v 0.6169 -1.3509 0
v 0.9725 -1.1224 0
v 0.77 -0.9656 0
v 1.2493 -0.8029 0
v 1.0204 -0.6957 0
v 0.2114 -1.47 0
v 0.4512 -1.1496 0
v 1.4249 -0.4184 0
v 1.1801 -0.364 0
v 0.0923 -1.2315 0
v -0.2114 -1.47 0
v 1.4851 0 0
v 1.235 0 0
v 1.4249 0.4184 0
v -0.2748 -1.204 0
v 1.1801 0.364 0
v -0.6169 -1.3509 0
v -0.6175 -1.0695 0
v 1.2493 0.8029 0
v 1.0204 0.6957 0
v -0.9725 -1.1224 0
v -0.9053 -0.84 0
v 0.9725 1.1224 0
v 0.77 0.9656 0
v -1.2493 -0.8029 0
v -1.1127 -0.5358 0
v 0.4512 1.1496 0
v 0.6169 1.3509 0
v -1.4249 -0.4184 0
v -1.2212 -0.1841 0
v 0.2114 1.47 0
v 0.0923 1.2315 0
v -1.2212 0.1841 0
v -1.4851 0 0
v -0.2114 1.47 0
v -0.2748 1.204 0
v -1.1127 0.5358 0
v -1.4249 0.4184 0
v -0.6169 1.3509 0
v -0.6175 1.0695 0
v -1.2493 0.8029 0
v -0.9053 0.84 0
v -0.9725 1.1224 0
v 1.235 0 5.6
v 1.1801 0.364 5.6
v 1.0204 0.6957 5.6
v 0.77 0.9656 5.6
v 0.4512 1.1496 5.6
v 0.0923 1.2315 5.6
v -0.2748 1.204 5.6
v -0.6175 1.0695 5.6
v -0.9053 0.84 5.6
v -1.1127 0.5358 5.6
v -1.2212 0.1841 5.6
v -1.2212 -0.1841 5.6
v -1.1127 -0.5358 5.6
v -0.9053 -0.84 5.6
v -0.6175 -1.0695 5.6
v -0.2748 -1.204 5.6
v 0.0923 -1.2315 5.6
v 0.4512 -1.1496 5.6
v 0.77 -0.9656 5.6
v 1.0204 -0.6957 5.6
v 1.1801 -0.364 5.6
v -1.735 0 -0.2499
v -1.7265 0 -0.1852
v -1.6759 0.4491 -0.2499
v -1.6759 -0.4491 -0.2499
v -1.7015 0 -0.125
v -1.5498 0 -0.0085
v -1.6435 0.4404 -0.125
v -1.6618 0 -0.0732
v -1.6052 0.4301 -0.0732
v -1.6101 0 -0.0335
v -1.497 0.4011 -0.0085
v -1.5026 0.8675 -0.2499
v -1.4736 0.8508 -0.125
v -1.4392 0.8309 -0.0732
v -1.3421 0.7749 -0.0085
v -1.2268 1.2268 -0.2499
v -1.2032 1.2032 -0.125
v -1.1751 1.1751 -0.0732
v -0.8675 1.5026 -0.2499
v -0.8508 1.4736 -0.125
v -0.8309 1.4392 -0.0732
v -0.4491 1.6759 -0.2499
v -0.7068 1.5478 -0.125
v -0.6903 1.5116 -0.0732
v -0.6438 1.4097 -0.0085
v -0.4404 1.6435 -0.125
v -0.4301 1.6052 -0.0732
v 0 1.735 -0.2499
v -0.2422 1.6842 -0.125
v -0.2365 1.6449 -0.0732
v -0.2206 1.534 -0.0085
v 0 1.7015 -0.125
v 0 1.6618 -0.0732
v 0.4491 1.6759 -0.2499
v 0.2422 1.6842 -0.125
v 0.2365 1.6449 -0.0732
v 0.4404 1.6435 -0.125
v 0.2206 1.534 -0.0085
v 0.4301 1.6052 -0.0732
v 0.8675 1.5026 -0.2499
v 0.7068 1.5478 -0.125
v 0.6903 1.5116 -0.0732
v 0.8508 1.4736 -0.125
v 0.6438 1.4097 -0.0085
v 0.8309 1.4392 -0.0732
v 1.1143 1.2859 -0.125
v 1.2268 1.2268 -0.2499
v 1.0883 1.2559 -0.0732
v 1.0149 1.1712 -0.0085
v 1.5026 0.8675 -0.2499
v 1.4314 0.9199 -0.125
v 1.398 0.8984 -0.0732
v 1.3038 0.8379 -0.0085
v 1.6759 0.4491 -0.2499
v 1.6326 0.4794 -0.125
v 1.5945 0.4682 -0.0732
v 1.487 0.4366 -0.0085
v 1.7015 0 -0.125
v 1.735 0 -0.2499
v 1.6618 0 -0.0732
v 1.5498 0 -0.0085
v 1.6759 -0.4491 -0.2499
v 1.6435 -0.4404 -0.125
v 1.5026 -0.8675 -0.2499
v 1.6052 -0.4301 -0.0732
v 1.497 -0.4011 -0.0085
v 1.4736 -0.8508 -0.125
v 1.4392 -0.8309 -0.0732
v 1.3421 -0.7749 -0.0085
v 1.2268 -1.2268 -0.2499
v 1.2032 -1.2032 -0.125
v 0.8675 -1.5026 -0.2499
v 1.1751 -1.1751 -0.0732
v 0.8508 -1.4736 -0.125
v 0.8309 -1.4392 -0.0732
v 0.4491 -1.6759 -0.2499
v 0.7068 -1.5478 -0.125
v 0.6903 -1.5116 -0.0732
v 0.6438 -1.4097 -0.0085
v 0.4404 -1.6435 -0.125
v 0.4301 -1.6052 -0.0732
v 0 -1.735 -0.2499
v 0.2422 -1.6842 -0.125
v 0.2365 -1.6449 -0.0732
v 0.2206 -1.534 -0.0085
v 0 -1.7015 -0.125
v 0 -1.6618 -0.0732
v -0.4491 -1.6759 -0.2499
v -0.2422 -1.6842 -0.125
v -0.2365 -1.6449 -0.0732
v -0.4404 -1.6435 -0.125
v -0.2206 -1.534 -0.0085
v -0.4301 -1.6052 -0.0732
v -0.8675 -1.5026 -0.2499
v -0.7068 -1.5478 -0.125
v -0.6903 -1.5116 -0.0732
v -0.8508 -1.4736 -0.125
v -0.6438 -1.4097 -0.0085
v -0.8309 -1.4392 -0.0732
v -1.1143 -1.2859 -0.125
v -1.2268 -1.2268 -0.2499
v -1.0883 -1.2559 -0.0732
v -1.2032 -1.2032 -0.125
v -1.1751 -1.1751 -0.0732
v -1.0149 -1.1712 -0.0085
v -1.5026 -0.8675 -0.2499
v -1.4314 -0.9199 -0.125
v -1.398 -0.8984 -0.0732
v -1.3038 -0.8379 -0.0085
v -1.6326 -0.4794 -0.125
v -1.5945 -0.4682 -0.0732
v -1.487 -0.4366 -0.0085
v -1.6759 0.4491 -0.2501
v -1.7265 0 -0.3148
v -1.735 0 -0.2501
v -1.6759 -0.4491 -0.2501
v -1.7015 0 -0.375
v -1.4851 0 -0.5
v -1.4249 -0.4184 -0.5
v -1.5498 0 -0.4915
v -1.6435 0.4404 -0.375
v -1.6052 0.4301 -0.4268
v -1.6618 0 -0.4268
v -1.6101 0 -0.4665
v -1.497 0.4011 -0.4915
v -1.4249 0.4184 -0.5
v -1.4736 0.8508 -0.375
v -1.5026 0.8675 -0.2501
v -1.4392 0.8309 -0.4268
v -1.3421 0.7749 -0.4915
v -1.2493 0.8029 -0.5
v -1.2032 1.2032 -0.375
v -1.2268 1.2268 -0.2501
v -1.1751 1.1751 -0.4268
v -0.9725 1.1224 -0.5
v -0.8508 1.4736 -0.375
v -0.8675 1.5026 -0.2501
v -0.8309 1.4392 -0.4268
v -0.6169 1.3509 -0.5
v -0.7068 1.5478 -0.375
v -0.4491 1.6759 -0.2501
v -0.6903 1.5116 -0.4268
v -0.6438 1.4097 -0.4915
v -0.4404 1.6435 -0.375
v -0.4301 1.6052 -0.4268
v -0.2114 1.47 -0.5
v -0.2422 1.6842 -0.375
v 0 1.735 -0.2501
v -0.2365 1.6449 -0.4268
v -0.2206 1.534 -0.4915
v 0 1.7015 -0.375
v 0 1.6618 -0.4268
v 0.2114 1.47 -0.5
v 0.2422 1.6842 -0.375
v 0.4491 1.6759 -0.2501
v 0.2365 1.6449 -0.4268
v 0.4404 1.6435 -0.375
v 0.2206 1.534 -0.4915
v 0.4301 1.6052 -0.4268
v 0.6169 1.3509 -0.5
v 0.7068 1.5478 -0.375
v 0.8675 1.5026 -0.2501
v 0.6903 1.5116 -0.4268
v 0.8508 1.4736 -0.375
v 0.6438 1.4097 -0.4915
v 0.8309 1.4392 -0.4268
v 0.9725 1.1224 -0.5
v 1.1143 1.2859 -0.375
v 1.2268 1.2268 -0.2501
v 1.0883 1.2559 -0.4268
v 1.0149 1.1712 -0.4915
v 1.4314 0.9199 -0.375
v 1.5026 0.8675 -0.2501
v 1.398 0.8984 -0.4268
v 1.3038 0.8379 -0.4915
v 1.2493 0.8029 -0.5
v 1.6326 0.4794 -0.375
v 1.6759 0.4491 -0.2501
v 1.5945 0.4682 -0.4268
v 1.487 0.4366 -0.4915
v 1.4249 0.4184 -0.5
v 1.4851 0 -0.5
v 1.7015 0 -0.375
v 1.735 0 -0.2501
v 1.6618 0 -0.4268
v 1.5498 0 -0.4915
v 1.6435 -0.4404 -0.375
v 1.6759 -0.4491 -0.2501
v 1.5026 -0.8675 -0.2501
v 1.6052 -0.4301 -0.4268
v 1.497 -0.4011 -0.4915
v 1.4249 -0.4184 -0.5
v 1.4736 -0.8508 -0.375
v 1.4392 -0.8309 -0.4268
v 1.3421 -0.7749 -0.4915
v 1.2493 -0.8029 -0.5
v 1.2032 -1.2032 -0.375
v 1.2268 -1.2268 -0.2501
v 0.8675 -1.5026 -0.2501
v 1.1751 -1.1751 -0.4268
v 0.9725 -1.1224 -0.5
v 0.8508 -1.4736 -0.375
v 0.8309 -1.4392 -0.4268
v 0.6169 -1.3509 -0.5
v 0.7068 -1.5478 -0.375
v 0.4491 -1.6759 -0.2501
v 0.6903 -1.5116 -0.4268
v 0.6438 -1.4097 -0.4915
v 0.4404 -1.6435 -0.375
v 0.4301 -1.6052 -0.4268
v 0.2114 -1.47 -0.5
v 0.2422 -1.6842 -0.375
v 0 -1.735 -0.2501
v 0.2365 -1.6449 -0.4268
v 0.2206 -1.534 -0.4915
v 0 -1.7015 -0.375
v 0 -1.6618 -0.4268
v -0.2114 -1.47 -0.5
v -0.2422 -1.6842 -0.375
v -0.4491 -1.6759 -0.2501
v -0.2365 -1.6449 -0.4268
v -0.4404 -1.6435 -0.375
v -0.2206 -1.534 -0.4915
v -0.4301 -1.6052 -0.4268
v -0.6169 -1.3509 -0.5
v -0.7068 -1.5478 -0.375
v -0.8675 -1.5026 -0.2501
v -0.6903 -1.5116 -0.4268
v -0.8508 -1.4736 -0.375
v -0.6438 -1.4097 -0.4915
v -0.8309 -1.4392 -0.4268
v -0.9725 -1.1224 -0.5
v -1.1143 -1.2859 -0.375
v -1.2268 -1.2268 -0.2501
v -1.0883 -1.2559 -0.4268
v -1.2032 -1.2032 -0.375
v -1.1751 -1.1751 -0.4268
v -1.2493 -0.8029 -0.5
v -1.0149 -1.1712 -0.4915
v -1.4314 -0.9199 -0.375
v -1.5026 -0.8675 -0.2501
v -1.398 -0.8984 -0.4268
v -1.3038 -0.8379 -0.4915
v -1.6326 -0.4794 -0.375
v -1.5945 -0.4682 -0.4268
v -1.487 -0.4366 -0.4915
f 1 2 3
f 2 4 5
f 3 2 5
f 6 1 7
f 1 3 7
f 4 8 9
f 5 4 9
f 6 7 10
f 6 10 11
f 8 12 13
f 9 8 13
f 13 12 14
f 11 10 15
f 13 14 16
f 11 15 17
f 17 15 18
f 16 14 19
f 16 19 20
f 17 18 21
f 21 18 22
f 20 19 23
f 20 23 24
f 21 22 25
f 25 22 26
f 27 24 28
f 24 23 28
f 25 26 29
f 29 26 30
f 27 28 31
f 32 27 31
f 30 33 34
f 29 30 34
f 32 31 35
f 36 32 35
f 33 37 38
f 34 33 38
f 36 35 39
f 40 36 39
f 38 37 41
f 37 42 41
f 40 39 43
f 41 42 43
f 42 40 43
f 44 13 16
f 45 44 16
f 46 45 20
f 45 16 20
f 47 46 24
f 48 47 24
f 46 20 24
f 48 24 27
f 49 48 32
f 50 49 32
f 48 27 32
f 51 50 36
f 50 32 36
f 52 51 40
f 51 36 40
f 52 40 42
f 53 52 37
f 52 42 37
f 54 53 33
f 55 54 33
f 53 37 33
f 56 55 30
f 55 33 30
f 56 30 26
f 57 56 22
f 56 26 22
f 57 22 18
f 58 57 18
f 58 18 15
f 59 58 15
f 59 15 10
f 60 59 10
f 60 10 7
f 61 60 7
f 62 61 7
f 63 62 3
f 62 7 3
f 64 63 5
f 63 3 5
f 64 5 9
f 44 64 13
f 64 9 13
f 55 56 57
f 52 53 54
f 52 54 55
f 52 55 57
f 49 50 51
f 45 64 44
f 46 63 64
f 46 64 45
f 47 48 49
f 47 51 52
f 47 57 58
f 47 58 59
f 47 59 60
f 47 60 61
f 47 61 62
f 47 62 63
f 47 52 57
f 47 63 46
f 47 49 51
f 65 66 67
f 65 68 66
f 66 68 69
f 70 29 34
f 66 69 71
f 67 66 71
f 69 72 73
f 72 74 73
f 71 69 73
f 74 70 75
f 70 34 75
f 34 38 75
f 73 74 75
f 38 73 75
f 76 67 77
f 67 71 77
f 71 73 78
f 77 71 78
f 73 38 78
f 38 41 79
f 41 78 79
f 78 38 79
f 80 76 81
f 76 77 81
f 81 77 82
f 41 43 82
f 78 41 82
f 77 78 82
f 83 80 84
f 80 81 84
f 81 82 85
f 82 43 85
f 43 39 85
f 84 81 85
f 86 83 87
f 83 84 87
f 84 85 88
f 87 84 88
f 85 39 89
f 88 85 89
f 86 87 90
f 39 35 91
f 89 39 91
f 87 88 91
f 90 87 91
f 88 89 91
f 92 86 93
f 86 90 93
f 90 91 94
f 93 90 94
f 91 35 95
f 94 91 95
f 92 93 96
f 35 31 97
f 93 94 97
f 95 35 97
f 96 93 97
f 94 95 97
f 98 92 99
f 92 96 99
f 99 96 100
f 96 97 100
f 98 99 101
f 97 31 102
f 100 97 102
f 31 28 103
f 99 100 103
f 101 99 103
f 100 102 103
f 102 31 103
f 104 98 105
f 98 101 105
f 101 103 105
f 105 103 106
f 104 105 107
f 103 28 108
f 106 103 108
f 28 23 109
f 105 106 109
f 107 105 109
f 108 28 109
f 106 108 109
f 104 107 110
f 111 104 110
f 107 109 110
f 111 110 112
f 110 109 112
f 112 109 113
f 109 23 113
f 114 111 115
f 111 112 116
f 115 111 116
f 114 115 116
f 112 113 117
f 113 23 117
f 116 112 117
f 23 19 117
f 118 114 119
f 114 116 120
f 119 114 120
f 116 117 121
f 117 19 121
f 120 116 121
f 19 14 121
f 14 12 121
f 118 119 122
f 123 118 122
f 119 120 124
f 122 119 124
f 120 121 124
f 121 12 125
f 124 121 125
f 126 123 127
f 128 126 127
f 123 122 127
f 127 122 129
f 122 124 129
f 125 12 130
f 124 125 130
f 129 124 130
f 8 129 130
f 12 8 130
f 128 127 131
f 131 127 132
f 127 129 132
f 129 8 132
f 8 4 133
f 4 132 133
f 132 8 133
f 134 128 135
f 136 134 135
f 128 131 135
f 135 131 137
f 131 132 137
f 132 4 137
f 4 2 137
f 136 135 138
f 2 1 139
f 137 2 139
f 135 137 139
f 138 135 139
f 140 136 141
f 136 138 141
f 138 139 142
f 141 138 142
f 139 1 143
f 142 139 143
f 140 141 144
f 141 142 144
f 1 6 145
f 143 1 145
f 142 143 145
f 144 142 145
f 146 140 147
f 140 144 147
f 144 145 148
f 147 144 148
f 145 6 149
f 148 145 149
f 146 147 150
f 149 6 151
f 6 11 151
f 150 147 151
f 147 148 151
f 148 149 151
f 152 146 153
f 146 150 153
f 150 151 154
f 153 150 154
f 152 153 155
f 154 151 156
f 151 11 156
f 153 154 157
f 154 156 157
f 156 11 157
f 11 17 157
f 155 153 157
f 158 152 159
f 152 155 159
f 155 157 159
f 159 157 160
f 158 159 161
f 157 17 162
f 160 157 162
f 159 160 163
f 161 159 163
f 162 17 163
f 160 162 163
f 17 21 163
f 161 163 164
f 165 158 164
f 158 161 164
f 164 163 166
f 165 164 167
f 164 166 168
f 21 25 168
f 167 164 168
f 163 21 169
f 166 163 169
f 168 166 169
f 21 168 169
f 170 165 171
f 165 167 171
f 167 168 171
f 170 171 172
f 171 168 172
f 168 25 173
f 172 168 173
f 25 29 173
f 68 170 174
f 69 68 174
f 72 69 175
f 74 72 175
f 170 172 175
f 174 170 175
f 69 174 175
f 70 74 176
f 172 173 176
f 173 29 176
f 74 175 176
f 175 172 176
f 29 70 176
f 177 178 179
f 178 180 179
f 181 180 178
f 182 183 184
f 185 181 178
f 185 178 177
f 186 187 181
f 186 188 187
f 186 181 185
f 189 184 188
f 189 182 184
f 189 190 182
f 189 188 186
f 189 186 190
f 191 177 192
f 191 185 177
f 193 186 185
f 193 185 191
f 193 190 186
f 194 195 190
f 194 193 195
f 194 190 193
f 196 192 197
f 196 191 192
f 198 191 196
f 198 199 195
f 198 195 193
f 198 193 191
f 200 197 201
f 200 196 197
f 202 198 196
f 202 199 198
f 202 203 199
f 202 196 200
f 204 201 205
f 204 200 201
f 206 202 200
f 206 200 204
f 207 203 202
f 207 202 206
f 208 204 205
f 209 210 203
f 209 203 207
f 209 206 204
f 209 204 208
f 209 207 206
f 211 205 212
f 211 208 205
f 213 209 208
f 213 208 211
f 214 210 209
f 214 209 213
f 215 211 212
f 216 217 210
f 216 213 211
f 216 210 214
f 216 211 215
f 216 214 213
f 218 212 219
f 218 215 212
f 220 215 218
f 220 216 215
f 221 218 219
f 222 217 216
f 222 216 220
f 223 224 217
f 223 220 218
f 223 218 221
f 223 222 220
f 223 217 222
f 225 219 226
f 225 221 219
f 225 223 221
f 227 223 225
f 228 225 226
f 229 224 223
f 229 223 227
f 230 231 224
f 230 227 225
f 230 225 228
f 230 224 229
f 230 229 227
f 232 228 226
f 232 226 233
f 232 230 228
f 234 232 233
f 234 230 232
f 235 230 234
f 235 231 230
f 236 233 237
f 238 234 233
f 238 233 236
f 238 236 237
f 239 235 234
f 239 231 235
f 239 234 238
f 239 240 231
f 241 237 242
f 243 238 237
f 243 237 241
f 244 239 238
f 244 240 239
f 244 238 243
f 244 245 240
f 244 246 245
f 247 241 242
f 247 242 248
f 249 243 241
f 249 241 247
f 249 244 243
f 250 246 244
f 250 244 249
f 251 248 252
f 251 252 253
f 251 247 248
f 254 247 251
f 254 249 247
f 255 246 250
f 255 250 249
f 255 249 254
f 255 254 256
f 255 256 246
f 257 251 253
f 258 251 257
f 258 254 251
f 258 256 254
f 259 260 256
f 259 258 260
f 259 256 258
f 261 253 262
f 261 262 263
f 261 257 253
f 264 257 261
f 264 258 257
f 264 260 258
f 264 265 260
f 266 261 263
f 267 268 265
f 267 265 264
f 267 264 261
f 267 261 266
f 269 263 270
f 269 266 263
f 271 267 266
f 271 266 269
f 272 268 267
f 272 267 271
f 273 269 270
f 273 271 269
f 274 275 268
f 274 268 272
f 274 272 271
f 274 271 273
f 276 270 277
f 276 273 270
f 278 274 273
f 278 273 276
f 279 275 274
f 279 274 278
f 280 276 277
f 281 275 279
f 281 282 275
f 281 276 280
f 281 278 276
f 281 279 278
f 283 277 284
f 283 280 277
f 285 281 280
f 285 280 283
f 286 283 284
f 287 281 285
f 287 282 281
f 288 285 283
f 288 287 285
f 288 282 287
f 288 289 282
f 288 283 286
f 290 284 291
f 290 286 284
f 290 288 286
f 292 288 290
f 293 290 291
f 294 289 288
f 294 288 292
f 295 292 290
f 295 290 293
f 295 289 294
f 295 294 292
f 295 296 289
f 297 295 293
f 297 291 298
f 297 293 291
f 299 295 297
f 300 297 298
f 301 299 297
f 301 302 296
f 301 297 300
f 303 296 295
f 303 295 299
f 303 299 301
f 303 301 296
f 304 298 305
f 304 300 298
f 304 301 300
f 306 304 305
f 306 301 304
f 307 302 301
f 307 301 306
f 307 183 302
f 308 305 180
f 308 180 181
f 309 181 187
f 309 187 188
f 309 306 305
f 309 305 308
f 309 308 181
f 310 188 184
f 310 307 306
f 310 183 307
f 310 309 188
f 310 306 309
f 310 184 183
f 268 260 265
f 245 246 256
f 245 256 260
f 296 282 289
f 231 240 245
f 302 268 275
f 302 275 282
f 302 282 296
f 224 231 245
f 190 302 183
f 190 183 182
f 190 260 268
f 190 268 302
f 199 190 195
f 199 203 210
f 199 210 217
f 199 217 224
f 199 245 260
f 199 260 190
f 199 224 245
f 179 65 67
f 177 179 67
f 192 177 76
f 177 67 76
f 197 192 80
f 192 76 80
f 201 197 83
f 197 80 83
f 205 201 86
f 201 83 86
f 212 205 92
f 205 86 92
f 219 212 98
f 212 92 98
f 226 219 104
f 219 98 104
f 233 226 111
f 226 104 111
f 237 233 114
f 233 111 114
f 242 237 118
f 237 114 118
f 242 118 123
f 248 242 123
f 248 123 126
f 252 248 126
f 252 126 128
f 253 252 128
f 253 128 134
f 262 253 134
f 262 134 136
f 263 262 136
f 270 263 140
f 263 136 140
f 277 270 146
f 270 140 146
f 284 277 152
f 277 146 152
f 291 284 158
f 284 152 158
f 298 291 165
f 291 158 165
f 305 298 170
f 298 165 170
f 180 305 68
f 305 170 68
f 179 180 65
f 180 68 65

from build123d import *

# Parameters (mm, degrees)
SKETCH1_R           = 1.235
BOSS_EXTRUDE1_DEPTH = 5.6
SKETCH2_R           = 1.735
BOSS_EXTRUDE2_DEPTH = 0.5
FILLET1_R           = 0.25


with BuildPart() as part:
    # Sketch1 → Boss-Extrude1 (new body)
    with BuildSketch(Plane.XY):
        Circle(SKETCH1_R)
    extrude(amount=BOSS_EXTRUDE1_DEPTH)

    # Sketch2 → Boss-Extrude2 (add)
    with BuildSketch(Plane(origin=(0, 0, 0), x_dir=(-1, 0, 0), z_dir=(0, 0, -1))):
        Circle(SKETCH2_R)
    extrude(amount=BOSS_EXTRUDE2_DEPTH)

    # Fillet1
    fillet1_edges = [part.edges().sort_by_distance(p)[0] for p in [
        (1.735, 0, 0),
        (1.735, 0, -0.5),
    ]]
    fillet(fillet1_edges, radius=FILLET1_R - 0.0001)  # a hair under: the kernel refuses the full size


solid = part.part
